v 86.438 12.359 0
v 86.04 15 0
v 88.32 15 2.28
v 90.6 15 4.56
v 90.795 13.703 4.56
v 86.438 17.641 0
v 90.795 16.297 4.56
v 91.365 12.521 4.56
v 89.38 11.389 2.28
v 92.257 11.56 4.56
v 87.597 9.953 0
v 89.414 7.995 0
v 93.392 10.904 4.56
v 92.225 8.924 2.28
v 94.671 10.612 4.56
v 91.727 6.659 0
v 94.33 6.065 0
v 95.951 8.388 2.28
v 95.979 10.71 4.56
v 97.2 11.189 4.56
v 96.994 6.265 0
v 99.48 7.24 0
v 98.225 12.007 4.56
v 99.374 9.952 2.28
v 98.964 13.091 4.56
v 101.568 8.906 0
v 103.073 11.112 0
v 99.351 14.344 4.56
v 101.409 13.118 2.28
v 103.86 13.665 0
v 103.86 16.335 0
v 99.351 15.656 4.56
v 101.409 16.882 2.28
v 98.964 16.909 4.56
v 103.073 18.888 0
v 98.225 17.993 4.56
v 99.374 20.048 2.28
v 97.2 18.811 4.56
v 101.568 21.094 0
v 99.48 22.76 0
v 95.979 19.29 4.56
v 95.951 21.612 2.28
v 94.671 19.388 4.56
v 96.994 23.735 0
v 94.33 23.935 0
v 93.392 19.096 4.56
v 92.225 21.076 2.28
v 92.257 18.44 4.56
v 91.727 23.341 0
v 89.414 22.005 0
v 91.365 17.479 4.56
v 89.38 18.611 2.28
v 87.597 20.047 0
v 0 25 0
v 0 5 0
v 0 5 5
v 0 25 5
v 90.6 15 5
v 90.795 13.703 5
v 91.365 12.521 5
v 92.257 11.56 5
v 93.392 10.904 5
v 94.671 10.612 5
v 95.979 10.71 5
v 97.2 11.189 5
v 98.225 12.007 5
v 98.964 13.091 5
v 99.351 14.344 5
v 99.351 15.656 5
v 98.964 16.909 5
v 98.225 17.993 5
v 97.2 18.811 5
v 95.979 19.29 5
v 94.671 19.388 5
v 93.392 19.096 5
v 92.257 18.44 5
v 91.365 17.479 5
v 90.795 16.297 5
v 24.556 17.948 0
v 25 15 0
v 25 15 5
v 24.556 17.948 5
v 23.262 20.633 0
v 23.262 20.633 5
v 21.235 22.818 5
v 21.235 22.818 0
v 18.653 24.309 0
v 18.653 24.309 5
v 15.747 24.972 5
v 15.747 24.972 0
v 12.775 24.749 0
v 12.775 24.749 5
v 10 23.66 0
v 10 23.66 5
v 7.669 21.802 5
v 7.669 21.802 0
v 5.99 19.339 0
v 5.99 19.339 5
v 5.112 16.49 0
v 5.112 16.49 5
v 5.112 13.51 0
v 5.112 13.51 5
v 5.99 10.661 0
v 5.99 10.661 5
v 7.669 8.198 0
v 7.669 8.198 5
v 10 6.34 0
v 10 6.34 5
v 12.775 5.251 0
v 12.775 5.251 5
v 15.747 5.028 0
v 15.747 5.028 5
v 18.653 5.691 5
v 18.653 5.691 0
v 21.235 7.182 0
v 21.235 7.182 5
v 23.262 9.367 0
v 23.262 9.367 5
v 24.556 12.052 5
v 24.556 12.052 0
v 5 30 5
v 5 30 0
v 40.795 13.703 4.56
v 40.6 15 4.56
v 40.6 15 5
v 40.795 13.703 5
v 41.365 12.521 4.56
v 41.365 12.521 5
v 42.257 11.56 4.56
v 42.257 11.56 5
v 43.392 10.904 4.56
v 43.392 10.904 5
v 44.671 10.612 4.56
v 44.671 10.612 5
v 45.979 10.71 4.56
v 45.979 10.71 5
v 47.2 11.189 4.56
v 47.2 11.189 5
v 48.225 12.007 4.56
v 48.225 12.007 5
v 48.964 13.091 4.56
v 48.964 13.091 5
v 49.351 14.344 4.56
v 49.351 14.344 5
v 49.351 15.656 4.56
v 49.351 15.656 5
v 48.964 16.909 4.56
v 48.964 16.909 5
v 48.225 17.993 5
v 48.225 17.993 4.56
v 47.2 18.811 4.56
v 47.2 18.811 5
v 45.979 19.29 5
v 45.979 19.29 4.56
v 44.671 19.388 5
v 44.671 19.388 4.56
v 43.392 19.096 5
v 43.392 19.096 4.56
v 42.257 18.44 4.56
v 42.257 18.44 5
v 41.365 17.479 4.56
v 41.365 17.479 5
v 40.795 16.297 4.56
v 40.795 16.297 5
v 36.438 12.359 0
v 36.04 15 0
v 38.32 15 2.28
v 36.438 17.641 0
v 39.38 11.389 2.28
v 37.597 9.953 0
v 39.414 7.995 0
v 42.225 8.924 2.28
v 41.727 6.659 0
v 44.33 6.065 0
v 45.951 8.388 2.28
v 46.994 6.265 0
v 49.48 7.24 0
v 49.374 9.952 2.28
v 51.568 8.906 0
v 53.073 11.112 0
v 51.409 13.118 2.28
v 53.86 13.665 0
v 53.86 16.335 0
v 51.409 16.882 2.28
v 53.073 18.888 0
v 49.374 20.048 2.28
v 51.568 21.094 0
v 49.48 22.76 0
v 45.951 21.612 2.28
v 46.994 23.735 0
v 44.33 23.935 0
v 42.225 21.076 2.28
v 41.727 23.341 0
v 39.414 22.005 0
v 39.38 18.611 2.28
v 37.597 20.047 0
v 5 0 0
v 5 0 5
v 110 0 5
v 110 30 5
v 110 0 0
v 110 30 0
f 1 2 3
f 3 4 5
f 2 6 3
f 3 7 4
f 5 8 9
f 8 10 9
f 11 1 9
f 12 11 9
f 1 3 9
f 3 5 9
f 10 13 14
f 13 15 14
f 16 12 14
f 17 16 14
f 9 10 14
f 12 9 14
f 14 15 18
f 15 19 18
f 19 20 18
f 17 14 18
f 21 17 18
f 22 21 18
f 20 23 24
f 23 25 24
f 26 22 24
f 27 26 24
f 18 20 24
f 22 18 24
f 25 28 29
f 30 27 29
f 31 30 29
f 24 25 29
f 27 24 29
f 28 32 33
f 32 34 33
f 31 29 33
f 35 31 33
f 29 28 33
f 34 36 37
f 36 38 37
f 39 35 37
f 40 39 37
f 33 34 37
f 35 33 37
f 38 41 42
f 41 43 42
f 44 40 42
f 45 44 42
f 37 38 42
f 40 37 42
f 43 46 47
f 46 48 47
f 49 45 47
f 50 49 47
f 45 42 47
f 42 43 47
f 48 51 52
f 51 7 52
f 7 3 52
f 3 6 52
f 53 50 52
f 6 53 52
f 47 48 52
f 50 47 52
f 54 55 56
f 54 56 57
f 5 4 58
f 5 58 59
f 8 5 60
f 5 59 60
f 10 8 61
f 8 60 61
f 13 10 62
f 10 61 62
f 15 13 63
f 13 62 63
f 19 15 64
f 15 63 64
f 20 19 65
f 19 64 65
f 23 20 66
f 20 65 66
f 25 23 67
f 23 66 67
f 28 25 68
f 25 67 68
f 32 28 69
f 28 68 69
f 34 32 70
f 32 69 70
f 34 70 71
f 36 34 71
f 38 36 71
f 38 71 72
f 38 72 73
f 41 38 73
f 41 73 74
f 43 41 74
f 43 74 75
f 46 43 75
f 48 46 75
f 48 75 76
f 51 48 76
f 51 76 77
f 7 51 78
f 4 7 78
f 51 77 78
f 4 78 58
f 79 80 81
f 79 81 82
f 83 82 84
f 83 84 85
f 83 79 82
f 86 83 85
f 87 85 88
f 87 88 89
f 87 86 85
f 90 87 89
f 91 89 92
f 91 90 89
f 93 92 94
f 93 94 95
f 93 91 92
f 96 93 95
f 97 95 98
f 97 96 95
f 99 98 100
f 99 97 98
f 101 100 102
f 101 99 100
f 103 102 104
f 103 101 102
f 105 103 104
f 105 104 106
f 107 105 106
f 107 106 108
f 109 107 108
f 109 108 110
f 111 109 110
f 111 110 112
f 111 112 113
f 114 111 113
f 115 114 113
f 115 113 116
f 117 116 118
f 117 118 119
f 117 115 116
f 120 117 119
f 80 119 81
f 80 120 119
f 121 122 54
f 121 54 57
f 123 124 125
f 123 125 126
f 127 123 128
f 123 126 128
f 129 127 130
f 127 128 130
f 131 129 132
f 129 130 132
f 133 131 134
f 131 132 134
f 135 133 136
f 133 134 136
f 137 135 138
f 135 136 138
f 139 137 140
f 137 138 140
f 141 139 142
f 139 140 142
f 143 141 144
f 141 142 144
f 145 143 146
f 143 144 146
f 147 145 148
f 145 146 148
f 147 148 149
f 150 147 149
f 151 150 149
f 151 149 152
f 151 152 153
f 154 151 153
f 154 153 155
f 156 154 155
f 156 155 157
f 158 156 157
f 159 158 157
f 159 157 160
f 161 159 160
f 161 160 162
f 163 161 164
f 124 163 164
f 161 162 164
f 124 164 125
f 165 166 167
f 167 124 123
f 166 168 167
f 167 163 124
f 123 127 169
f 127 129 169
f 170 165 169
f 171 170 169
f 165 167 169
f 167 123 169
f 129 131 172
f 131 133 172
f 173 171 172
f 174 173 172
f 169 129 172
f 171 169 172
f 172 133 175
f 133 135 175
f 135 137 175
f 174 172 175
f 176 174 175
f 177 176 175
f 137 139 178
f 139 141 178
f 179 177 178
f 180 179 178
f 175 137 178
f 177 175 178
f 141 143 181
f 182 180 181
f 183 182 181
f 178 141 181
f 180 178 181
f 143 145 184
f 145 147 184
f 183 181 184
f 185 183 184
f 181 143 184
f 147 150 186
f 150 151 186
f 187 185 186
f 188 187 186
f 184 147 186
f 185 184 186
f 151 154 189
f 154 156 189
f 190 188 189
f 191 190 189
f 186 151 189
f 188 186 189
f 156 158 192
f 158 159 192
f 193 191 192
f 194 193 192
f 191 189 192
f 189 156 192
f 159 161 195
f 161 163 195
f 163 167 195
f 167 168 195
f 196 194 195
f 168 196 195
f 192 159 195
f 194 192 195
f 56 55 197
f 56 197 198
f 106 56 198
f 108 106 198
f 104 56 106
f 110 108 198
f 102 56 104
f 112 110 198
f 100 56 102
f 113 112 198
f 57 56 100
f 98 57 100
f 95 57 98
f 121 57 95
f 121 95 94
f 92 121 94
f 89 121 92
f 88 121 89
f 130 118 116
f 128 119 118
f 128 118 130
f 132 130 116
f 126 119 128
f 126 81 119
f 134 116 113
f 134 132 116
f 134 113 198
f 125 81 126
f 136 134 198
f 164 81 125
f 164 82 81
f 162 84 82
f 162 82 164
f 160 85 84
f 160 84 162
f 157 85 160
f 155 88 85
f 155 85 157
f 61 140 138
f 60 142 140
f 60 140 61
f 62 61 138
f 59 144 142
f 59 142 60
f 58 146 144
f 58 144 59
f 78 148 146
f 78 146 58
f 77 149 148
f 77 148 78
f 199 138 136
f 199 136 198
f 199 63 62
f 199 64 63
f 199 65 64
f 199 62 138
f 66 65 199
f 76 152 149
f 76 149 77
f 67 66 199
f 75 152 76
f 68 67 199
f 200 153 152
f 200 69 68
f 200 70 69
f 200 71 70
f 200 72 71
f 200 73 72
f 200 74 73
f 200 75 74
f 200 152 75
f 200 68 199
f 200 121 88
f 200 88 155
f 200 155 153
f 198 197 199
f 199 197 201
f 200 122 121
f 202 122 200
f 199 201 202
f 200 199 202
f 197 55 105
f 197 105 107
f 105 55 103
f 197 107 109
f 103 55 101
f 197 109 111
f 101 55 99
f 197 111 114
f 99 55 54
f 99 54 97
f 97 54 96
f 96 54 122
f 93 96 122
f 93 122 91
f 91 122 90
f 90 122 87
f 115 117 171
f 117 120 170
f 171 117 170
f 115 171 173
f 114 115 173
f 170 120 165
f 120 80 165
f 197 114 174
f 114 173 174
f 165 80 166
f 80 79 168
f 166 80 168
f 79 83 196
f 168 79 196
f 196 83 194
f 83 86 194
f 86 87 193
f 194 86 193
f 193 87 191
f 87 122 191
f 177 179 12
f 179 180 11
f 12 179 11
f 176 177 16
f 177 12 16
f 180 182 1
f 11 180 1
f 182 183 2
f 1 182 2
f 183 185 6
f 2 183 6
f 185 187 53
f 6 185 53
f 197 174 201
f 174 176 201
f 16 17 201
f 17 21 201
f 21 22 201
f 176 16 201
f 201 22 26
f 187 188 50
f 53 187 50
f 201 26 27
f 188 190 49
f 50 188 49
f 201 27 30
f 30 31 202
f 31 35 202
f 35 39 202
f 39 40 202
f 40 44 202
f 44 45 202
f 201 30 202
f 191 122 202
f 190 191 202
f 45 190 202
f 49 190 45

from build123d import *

# Parameters (mm, degrees)
F0_W           = 110
F0_H           = 30
F0_R           = 10
F1_DEPTH       = 5
F2_SIZE        = 5
F3_D           = 8.8
F3_CSINK_D     = 17.92
F3_CSINK_ANGLE = 90


with BuildPart() as f1:
    # F0 (on Top) → F1 (new body)
    with BuildSketch(Plane.XY):
        with Locations((55, 15)):
            Rectangle(F0_W, F0_H)
        with Locations((15, 15)):
            Circle(F0_R, mode=Mode.SUBTRACT)
    extrude(amount=F1_DEPTH)

    # F2
    f2_edges = [f1.edges().sort_by_distance(p)[0] for p in [
        (0, 30, 2.5),
        (0, 0, 2.5),
    ]]
    chamfer(f2_edges, length=F2_SIZE)

    # F3 (through all)
    with Locations(Plane(origin=(0, 0, 0), x_dir=(1, 0, 0), z_dir=(0, 0, -1))):
        with Locations((95, -15), (45, -15)):
            CounterSinkHole(F3_D / 2, F3_CSINK_D / 2, counter_sink_angle=F3_CSINK_ANGLE)


solid = f1.part
